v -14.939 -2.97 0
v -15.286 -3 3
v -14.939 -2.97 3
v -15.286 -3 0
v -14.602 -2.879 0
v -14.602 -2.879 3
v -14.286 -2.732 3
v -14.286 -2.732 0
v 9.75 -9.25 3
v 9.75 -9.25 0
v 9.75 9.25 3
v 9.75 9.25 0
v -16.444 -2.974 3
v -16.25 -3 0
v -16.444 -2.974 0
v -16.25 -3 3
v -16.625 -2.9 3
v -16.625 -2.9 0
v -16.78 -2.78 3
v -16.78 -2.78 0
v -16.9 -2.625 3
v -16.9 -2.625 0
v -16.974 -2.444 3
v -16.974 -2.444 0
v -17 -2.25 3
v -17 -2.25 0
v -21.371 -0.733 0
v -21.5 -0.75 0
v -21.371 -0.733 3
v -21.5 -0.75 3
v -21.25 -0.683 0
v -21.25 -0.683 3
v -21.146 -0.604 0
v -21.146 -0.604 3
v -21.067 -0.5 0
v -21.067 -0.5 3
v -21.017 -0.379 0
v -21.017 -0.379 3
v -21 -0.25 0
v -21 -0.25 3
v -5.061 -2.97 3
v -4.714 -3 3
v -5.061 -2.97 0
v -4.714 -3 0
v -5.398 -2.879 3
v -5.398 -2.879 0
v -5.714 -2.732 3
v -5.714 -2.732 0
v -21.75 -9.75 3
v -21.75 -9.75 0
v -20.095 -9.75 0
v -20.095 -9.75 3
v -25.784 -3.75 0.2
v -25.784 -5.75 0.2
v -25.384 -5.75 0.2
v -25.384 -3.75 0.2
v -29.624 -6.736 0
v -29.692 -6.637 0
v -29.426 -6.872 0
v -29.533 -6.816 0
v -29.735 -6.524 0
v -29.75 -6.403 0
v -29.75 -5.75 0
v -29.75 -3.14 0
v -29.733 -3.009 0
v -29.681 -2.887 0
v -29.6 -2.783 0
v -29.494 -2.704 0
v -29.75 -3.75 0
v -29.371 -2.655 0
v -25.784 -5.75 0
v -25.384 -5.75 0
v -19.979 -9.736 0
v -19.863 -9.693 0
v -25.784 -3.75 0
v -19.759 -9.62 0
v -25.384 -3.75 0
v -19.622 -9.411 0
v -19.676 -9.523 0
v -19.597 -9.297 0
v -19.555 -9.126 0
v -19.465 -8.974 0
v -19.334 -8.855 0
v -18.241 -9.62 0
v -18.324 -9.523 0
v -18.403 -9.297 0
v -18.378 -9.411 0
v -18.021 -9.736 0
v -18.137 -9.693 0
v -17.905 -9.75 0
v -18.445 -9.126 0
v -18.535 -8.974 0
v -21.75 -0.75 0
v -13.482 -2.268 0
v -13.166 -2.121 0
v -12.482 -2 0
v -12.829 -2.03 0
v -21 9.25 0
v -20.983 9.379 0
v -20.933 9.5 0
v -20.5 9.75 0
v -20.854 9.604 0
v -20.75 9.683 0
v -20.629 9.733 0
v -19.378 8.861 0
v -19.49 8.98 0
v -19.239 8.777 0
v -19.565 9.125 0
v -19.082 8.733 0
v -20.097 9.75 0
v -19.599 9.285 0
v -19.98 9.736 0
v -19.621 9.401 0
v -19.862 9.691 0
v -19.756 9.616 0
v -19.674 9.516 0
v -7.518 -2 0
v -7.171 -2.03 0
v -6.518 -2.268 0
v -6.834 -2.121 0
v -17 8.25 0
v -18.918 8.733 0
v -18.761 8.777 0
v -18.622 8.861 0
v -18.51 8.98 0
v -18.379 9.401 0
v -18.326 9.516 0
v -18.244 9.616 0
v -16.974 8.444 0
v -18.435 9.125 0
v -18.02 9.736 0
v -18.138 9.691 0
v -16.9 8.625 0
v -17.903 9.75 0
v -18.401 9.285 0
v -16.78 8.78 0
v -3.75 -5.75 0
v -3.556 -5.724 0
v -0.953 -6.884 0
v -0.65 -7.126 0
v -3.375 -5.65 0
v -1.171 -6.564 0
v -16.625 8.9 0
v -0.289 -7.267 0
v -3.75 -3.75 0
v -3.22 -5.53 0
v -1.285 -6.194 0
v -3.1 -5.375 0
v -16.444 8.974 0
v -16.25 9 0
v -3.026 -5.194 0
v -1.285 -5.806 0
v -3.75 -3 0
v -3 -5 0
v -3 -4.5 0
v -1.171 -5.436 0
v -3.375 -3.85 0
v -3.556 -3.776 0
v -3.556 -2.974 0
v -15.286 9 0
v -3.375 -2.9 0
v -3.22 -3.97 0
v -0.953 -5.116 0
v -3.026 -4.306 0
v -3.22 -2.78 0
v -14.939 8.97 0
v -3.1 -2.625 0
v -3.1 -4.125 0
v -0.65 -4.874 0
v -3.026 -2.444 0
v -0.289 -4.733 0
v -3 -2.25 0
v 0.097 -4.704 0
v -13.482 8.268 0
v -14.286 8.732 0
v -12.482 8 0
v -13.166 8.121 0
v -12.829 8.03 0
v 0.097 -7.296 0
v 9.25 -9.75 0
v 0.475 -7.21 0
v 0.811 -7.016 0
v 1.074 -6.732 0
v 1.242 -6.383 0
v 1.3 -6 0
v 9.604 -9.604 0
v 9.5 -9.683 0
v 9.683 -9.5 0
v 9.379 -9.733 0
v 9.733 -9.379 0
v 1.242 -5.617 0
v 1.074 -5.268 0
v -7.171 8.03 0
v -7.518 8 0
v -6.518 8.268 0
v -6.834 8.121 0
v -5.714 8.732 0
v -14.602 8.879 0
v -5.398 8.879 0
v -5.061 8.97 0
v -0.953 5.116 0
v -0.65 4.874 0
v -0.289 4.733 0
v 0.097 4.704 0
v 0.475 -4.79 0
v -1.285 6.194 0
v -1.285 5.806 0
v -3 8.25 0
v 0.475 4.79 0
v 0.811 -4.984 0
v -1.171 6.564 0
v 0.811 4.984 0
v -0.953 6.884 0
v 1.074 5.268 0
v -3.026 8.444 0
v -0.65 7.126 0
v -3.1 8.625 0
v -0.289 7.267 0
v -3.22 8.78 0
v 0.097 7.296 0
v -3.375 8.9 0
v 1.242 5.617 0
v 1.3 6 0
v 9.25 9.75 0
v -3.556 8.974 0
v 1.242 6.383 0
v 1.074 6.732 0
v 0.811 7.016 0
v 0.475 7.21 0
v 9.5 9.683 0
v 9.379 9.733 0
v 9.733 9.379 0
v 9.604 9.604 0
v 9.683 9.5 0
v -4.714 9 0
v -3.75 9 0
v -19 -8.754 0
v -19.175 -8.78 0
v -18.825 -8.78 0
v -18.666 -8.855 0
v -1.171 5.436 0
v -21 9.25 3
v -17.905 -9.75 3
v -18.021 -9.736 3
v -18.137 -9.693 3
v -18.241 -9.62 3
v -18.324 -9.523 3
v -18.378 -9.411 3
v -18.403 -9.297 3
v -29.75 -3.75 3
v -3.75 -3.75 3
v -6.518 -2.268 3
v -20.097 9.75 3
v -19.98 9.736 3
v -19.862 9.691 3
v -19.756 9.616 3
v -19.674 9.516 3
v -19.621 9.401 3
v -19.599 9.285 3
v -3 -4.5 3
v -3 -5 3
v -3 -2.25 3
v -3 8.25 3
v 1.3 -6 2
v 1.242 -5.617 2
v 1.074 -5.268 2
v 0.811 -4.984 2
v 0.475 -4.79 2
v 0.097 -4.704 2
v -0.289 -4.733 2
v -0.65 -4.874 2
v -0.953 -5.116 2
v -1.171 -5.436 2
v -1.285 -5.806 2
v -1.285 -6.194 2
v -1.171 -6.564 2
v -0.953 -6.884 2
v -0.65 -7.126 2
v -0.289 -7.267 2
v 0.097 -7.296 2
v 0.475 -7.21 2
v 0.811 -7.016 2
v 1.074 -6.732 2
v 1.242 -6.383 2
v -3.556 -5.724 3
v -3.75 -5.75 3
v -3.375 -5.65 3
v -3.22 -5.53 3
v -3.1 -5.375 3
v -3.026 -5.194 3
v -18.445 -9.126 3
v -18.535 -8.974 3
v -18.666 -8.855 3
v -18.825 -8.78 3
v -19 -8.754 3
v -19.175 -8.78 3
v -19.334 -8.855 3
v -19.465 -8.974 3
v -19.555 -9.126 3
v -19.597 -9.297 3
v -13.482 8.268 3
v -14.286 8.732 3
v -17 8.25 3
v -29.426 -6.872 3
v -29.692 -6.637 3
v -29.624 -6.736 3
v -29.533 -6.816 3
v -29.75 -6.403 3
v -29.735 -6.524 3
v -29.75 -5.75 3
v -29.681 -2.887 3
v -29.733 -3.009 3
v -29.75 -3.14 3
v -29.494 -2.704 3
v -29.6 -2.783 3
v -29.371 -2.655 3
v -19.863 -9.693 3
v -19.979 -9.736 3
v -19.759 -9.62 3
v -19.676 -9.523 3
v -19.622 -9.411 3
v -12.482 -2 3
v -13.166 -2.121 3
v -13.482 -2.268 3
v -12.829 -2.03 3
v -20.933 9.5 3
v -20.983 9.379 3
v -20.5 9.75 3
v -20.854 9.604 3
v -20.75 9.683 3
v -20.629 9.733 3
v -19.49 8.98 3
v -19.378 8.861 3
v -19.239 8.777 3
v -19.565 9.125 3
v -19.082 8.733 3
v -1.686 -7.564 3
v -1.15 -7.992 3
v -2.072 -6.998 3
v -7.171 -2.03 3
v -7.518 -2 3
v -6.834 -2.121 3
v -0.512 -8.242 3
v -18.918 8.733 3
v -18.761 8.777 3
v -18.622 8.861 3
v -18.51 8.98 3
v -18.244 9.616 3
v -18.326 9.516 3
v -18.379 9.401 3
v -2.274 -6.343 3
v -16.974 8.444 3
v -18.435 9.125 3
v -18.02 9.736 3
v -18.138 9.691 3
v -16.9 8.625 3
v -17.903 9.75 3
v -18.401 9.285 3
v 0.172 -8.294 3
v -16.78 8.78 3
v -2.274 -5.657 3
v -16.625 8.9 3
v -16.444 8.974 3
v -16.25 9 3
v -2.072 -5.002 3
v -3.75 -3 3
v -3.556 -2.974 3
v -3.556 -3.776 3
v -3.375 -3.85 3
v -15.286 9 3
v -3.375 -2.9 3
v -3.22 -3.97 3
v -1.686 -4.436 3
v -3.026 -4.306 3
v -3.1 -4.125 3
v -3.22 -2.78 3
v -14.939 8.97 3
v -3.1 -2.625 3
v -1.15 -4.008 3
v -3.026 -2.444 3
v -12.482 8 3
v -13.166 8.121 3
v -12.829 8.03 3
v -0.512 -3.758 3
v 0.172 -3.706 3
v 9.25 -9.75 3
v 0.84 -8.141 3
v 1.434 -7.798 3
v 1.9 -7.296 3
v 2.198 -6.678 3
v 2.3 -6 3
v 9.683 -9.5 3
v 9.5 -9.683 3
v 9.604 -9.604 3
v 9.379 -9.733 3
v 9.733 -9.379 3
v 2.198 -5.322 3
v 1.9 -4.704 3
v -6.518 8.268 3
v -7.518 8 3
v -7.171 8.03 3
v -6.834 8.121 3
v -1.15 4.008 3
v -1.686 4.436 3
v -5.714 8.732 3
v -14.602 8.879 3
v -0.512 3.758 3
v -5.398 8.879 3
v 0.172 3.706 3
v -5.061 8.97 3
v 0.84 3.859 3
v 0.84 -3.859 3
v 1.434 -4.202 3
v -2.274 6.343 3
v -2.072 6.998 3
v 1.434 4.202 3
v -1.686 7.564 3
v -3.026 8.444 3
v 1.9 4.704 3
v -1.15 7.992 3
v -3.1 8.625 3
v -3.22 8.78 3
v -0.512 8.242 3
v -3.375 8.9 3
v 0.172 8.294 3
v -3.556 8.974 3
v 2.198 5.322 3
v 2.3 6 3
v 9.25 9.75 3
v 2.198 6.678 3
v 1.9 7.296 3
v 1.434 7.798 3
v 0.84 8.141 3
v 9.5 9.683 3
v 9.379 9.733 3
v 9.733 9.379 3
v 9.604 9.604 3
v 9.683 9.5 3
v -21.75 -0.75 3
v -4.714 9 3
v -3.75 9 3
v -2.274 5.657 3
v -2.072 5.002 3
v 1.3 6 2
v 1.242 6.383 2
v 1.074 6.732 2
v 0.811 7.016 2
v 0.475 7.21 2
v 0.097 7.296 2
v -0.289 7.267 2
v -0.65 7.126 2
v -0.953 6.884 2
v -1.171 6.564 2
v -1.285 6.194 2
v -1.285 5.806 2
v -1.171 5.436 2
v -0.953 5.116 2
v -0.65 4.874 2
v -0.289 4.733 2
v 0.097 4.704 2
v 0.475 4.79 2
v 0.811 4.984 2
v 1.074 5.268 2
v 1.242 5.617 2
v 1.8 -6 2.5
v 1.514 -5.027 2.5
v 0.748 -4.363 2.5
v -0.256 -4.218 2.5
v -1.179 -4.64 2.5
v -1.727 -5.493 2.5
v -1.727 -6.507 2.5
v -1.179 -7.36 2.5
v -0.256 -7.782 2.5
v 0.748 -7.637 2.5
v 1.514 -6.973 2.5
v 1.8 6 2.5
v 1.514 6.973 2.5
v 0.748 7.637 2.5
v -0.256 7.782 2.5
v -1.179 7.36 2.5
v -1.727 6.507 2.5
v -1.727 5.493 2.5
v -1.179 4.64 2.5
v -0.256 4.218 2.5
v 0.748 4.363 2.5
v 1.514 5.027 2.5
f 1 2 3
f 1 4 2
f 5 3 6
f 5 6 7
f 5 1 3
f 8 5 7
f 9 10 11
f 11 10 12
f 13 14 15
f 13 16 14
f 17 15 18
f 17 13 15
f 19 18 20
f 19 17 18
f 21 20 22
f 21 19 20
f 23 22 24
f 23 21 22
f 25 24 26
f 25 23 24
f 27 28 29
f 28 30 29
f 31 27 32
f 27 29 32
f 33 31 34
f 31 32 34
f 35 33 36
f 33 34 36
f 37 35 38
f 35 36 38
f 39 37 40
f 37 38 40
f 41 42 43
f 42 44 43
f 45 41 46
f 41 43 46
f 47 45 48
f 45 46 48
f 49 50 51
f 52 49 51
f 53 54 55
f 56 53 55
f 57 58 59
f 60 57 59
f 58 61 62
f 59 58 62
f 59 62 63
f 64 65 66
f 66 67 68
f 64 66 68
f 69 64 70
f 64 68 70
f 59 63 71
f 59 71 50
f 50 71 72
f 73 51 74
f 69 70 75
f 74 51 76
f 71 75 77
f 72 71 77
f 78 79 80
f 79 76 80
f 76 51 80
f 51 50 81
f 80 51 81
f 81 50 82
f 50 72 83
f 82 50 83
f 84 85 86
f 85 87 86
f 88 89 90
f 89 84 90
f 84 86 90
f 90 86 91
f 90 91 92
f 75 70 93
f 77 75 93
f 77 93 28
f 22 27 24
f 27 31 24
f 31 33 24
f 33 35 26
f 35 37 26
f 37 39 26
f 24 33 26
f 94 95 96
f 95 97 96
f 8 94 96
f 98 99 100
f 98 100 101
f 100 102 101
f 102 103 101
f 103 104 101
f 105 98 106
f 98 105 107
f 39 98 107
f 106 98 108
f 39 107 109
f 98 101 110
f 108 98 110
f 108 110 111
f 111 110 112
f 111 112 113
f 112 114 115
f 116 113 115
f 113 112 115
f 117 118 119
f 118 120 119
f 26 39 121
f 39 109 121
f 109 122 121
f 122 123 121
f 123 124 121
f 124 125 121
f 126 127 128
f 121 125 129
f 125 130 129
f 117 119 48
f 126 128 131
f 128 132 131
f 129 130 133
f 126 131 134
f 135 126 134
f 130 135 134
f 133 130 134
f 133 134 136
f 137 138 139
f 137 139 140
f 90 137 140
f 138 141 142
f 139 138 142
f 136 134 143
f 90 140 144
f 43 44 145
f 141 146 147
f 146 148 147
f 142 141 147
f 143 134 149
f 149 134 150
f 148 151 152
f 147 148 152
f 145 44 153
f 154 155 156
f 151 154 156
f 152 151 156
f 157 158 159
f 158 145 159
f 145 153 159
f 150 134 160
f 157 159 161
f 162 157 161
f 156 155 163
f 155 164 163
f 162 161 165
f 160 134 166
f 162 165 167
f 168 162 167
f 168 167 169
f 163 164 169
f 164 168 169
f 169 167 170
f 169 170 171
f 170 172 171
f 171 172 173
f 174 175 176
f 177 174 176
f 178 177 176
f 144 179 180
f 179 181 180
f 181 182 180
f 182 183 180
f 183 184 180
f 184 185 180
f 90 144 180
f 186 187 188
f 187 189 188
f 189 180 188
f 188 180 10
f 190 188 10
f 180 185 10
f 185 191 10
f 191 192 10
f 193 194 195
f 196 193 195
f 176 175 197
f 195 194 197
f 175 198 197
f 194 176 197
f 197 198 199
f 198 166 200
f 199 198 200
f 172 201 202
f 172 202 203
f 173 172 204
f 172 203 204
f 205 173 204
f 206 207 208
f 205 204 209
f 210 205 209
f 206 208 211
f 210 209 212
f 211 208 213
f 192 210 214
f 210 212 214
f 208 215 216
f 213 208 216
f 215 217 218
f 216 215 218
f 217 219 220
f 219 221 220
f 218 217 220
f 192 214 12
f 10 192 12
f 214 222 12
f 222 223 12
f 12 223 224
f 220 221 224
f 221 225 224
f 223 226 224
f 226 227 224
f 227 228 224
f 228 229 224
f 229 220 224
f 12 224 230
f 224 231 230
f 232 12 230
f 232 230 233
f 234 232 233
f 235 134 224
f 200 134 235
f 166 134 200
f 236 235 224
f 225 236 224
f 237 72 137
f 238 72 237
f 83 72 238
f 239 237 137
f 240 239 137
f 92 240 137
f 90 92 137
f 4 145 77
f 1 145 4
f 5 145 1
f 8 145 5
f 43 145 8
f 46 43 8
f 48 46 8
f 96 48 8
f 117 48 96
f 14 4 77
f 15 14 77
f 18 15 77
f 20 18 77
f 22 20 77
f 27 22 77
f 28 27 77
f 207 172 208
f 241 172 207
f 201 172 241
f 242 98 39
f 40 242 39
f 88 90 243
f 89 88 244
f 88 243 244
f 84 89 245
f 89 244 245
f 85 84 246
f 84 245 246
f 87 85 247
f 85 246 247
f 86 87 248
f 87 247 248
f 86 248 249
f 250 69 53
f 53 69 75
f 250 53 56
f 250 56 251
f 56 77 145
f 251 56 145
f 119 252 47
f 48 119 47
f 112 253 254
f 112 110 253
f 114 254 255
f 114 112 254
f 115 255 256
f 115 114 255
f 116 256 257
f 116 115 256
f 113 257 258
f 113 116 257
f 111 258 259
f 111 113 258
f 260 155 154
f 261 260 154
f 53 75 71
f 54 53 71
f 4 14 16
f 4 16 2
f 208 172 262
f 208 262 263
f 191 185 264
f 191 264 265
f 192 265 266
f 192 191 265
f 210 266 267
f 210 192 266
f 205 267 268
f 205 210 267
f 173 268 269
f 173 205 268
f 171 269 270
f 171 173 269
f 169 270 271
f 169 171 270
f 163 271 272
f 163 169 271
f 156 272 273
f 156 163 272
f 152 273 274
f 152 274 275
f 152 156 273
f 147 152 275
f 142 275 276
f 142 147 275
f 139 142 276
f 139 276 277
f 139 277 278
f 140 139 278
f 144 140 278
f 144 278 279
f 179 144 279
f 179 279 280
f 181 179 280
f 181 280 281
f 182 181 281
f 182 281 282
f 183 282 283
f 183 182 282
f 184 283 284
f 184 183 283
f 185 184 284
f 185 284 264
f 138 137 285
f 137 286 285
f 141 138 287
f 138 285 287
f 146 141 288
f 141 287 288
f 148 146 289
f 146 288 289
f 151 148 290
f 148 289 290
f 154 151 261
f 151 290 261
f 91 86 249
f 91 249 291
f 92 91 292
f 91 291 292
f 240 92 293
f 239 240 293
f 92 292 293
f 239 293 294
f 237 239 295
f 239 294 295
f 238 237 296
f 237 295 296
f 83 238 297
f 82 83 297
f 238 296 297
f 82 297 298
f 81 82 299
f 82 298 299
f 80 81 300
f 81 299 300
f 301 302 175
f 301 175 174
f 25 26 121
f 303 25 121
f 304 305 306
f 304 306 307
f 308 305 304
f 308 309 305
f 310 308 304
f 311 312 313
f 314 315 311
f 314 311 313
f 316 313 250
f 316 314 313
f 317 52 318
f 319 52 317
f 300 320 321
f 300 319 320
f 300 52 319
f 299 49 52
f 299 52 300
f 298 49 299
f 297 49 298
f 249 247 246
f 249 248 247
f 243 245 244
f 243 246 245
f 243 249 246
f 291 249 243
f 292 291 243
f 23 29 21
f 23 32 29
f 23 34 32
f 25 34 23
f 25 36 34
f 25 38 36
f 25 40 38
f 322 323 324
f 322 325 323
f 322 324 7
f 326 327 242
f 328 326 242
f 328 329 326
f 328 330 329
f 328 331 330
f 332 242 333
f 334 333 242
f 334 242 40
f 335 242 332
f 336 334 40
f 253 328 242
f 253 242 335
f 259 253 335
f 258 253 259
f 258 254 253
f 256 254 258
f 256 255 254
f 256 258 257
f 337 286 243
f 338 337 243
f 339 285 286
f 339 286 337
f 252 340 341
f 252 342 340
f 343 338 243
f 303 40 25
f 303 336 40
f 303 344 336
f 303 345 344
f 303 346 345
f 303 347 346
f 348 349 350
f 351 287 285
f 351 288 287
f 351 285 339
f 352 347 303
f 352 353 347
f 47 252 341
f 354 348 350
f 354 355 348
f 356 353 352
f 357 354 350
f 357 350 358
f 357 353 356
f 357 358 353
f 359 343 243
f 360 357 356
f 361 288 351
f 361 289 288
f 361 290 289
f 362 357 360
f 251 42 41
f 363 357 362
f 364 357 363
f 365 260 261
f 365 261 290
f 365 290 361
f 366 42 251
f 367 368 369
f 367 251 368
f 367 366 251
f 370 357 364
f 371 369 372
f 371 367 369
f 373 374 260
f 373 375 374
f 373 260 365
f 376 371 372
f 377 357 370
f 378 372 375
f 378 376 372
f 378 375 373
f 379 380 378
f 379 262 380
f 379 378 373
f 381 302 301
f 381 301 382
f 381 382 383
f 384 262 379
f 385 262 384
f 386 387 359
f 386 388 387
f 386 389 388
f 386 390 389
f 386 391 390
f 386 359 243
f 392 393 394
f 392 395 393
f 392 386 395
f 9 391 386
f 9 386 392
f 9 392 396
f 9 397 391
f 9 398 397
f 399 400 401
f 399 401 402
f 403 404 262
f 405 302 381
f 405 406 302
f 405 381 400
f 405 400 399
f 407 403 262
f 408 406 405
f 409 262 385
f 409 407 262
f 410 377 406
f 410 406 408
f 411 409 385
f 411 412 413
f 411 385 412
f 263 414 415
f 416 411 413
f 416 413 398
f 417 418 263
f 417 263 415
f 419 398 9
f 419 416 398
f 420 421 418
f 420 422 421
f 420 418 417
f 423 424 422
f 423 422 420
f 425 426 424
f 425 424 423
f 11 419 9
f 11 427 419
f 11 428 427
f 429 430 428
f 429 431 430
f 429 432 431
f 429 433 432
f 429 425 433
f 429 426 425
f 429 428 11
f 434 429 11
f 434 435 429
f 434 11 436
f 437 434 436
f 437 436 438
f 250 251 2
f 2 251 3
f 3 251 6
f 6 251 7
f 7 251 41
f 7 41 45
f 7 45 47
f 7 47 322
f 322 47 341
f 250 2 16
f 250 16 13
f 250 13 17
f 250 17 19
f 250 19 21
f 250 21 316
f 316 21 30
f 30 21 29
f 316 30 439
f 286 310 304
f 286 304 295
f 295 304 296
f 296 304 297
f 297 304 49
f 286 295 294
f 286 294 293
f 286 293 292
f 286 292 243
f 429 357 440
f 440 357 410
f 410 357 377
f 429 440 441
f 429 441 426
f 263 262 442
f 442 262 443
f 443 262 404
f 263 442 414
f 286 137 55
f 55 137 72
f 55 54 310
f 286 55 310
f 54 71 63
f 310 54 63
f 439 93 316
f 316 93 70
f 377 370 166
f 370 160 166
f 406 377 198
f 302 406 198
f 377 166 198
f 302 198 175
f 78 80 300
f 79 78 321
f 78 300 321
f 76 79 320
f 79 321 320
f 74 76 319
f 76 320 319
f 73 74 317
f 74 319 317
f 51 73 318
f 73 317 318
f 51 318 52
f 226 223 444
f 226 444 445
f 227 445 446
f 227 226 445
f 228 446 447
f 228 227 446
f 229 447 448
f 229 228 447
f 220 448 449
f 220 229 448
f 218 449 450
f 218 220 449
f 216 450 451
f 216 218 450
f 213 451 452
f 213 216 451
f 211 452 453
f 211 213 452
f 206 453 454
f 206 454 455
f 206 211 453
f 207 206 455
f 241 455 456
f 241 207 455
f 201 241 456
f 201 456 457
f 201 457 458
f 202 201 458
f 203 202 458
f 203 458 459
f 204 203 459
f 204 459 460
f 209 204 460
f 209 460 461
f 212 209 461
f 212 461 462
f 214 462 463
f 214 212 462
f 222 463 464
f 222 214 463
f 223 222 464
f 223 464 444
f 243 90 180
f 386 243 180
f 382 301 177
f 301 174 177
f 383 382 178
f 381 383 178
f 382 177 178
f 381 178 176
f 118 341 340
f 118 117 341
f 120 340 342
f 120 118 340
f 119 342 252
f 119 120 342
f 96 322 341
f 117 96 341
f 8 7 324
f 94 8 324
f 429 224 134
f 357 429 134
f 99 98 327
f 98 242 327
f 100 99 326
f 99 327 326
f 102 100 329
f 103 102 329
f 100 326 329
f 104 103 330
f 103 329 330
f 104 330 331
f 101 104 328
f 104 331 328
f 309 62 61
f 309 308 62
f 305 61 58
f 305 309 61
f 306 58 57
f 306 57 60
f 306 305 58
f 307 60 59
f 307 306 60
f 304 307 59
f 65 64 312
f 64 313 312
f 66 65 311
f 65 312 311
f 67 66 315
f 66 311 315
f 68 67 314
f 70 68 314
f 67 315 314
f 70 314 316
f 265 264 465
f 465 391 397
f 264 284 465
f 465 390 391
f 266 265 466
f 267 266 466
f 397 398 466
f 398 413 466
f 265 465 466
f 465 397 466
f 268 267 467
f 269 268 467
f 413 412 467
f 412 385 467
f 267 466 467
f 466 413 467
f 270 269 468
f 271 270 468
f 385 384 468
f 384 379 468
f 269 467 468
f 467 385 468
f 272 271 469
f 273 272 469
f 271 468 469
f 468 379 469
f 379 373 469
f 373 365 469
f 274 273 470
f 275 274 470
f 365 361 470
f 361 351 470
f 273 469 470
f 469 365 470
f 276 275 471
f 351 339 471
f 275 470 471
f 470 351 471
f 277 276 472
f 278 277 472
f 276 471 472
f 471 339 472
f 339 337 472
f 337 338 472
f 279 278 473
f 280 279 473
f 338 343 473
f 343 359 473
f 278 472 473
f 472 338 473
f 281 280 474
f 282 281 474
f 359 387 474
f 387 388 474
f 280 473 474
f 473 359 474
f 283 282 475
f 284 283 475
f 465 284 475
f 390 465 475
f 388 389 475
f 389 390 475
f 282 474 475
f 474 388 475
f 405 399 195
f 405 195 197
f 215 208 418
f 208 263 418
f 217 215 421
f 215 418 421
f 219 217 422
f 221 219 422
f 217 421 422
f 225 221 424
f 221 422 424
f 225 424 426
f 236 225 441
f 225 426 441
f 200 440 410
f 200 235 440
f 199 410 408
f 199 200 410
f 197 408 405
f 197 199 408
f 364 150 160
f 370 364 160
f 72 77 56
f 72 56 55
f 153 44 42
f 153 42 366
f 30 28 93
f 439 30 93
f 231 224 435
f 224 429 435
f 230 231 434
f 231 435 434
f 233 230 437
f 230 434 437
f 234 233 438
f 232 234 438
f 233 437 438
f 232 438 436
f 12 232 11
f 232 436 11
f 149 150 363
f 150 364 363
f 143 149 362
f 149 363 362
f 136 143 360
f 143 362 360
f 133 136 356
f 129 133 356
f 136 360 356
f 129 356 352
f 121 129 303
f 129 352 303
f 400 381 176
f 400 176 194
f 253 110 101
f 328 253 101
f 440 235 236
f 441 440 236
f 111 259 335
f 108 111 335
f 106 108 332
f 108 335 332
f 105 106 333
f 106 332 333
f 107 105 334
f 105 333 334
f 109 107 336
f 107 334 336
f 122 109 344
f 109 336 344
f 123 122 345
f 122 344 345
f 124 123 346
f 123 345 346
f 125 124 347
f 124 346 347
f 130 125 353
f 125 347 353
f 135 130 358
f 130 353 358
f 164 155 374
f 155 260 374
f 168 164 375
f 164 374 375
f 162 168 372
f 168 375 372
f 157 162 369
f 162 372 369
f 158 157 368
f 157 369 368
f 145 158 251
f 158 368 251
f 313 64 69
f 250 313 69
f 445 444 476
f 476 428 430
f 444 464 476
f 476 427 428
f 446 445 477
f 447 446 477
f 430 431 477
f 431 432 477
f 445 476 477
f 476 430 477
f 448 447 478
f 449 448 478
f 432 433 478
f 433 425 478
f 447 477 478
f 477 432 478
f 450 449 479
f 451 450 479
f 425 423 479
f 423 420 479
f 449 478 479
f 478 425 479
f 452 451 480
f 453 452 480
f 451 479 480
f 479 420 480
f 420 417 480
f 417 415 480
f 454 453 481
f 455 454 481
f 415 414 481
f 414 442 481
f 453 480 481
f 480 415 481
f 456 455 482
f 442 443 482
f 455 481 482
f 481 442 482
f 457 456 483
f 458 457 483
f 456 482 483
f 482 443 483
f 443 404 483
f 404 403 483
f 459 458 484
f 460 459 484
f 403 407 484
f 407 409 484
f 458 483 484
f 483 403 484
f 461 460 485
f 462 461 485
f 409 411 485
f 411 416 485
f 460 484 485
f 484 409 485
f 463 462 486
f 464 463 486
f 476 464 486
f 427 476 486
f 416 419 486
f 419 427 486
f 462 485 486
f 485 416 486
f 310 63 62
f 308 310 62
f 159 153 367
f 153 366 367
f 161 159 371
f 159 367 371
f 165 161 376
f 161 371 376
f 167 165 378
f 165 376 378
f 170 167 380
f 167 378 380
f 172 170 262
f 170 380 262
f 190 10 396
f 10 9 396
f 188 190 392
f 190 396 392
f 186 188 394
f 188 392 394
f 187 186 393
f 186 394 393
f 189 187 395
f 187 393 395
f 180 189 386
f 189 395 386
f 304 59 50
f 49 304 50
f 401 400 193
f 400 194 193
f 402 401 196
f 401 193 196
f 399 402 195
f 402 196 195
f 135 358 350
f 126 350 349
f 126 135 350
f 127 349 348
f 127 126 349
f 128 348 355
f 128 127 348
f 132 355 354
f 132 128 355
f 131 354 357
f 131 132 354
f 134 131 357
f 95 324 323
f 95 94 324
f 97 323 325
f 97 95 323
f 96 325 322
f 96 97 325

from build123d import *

# Parameters (mm, degrees)
SKETCH_R     = 1.3
SKETCH_W     = 14
SKETCH_H     = 12
PAD_DEPTH    = 3
FILLET_R     = 0.75
POCKET_DEPTH = 5
FILLET001_R  = 0.5
CHAMFER_SIZE = 1
PAD001_DEPTH = 3
FILLET002_R  = 2
SKETCH004_W  = 0.400118
SKETCH004_H  = 2.725121
PAD002_DEPTH = 0.2


with BuildPart() as part:
    # Sketch (on XY_Plane of Origin) → Pad (new body)
    with BuildSketch(Plane.XY):
        Polygon((-9.75, -9.75), (9.75, -9.75), (9.75, 9.75), (-9.75, 9.75), (-21, 9.75), (-21, -0.75), (-21.75, -0.75), (-29.75, -2.75), (-29.75, -3.75), (-3, -3.75), (-3, -5.75), (-29.75, -5.75), (-29.75, -6.75), (-21.75, -9.75), align=None)
        with Locations((0, 6)):
            Circle(SKETCH_R, mode=Mode.SUBTRACT)
        with Locations((0, -6)):
            Circle(SKETCH_R, mode=Mode.SUBTRACT)
        with Locations((-10, 3)):
            Rectangle(SKETCH_W, SKETCH_H, mode=Mode.SUBTRACT)
    extrude(amount=PAD_DEPTH)

    # Fillet
    fillet_edges = [part.edges().sort_by_distance(p)[0] for p in [
        (-3, -3, 1.5),
        (-3, 9, 1.5),
        (-17, 9, 1.5),
        (-17, -3, 1.5),
        (-3, -3.75, 1.5),
        (-3, -5.75, 1.5),
    ]]
    fillet(fillet_edges, radius=FILLET_R)

    # Sketch002 (on Face26 of Fillet) → Pocket (cut)
    with BuildSketch(Plane.XY.offset(3)):
        with BuildLine():
            ThreePointArc((-18.4, -9.353833), (-19, -8.753833), (-19.6, -9.353833))
            Line((-19.6, -9.353833), (-19.6, -11.103725))
            ThreePointArc((-19.6, -11.103725), (-19, -11.703725), (-18.4, -11.103725))
            Line((-18.4, -9.353833), (-18.4, -11.103725))
        make_face()
        with BuildLine():
            ThreePointArc((-18.4, 12.382466), (-19, 12.982466), (-19.6, 12.382466))
            Line((-19.6, 12.382466), (-19.6, 9.326973))
            ThreePointArc((-19.6, 9.326973), (-19, 8.726973), (-18.4, 9.326973))
            Line((-18.4, 12.382466), (-18.4, 9.326973))
        make_face()
    extrude(amount=-POCKET_DEPTH, mode=Mode.SUBTRACT)

    # Fillet001
    fillet001_edges = [part.edges().sort_by_distance(p)[0] for p in [
        (-21, 9.75, 1.5),
        (-21, -0.75, 1.5),
        (9.75, -9.75, 1.5),
        (9.75, 9.75, 1.5),
        (-19.6, 9.75, 1.5),
        (-18.4, 9.75, 1.5),
        (-19.6, -9.75, 1.5),
        (-18.4, -9.75, 1.5),
        (-29.75, -6.75, 1.5),
        (-29.75, -2.75, 1.5),
    ]]
    fillet(fillet001_edges, radius=FILLET001_R)

    # Chamfer
    chamfer_edges = [part.edges().sort_by_distance(p)[0] for p in [
        (-1.3, 6, 3),
        (-1.3, -6, 3),
    ]]
    chamfer(chamfer_edges, length=CHAMFER_SIZE)

    # Sketch003 (on Face4 of Chamfer) → Pad001 (join)
    with BuildSketch(Plane.XY.offset(3)):
        Polygon((-14.75, 9), (-13.017949, 8), (-6.982051, 8), (-5.25, 9), align=None)
        Polygon((-14.75, -3), (-13.017949, -2), (-6.982051, -2), (-5.25, -3), align=None)
    extrude(amount=-PAD001_DEPTH)

    # Fillet002
    fillet002_edges = [part.edges().sort_by_distance(p)[0] for p in [
        (-5.25, -3, 1.5),
        (-14.75, -3, 1.5),
        (-13.017949, -2, 1.5),
        (-6.982051, -2, 1.5),
        (-5.25, 9, 1.5),
        (-6.982051, 8, 1.5),
        (-13.017949, 8, 1.5),
        (-14.75, 9, 1.5),
    ]]
    fillet(fillet002_edges, radius=FILLET002_R)

    # Sketch004 (on Face1 of Fillet002) → Pad002 (join)
    with BuildSketch(Plane(origin=(0, 0, 0), x_dir=(1, 0, 0), z_dir=(0, 0, -1))):
        with Locations((-25.583762, 4.610938)):
            Rectangle(SKETCH004_W, SKETCH004_H)
    extrude(amount=-PAD002_DEPTH)


solid = part.part
